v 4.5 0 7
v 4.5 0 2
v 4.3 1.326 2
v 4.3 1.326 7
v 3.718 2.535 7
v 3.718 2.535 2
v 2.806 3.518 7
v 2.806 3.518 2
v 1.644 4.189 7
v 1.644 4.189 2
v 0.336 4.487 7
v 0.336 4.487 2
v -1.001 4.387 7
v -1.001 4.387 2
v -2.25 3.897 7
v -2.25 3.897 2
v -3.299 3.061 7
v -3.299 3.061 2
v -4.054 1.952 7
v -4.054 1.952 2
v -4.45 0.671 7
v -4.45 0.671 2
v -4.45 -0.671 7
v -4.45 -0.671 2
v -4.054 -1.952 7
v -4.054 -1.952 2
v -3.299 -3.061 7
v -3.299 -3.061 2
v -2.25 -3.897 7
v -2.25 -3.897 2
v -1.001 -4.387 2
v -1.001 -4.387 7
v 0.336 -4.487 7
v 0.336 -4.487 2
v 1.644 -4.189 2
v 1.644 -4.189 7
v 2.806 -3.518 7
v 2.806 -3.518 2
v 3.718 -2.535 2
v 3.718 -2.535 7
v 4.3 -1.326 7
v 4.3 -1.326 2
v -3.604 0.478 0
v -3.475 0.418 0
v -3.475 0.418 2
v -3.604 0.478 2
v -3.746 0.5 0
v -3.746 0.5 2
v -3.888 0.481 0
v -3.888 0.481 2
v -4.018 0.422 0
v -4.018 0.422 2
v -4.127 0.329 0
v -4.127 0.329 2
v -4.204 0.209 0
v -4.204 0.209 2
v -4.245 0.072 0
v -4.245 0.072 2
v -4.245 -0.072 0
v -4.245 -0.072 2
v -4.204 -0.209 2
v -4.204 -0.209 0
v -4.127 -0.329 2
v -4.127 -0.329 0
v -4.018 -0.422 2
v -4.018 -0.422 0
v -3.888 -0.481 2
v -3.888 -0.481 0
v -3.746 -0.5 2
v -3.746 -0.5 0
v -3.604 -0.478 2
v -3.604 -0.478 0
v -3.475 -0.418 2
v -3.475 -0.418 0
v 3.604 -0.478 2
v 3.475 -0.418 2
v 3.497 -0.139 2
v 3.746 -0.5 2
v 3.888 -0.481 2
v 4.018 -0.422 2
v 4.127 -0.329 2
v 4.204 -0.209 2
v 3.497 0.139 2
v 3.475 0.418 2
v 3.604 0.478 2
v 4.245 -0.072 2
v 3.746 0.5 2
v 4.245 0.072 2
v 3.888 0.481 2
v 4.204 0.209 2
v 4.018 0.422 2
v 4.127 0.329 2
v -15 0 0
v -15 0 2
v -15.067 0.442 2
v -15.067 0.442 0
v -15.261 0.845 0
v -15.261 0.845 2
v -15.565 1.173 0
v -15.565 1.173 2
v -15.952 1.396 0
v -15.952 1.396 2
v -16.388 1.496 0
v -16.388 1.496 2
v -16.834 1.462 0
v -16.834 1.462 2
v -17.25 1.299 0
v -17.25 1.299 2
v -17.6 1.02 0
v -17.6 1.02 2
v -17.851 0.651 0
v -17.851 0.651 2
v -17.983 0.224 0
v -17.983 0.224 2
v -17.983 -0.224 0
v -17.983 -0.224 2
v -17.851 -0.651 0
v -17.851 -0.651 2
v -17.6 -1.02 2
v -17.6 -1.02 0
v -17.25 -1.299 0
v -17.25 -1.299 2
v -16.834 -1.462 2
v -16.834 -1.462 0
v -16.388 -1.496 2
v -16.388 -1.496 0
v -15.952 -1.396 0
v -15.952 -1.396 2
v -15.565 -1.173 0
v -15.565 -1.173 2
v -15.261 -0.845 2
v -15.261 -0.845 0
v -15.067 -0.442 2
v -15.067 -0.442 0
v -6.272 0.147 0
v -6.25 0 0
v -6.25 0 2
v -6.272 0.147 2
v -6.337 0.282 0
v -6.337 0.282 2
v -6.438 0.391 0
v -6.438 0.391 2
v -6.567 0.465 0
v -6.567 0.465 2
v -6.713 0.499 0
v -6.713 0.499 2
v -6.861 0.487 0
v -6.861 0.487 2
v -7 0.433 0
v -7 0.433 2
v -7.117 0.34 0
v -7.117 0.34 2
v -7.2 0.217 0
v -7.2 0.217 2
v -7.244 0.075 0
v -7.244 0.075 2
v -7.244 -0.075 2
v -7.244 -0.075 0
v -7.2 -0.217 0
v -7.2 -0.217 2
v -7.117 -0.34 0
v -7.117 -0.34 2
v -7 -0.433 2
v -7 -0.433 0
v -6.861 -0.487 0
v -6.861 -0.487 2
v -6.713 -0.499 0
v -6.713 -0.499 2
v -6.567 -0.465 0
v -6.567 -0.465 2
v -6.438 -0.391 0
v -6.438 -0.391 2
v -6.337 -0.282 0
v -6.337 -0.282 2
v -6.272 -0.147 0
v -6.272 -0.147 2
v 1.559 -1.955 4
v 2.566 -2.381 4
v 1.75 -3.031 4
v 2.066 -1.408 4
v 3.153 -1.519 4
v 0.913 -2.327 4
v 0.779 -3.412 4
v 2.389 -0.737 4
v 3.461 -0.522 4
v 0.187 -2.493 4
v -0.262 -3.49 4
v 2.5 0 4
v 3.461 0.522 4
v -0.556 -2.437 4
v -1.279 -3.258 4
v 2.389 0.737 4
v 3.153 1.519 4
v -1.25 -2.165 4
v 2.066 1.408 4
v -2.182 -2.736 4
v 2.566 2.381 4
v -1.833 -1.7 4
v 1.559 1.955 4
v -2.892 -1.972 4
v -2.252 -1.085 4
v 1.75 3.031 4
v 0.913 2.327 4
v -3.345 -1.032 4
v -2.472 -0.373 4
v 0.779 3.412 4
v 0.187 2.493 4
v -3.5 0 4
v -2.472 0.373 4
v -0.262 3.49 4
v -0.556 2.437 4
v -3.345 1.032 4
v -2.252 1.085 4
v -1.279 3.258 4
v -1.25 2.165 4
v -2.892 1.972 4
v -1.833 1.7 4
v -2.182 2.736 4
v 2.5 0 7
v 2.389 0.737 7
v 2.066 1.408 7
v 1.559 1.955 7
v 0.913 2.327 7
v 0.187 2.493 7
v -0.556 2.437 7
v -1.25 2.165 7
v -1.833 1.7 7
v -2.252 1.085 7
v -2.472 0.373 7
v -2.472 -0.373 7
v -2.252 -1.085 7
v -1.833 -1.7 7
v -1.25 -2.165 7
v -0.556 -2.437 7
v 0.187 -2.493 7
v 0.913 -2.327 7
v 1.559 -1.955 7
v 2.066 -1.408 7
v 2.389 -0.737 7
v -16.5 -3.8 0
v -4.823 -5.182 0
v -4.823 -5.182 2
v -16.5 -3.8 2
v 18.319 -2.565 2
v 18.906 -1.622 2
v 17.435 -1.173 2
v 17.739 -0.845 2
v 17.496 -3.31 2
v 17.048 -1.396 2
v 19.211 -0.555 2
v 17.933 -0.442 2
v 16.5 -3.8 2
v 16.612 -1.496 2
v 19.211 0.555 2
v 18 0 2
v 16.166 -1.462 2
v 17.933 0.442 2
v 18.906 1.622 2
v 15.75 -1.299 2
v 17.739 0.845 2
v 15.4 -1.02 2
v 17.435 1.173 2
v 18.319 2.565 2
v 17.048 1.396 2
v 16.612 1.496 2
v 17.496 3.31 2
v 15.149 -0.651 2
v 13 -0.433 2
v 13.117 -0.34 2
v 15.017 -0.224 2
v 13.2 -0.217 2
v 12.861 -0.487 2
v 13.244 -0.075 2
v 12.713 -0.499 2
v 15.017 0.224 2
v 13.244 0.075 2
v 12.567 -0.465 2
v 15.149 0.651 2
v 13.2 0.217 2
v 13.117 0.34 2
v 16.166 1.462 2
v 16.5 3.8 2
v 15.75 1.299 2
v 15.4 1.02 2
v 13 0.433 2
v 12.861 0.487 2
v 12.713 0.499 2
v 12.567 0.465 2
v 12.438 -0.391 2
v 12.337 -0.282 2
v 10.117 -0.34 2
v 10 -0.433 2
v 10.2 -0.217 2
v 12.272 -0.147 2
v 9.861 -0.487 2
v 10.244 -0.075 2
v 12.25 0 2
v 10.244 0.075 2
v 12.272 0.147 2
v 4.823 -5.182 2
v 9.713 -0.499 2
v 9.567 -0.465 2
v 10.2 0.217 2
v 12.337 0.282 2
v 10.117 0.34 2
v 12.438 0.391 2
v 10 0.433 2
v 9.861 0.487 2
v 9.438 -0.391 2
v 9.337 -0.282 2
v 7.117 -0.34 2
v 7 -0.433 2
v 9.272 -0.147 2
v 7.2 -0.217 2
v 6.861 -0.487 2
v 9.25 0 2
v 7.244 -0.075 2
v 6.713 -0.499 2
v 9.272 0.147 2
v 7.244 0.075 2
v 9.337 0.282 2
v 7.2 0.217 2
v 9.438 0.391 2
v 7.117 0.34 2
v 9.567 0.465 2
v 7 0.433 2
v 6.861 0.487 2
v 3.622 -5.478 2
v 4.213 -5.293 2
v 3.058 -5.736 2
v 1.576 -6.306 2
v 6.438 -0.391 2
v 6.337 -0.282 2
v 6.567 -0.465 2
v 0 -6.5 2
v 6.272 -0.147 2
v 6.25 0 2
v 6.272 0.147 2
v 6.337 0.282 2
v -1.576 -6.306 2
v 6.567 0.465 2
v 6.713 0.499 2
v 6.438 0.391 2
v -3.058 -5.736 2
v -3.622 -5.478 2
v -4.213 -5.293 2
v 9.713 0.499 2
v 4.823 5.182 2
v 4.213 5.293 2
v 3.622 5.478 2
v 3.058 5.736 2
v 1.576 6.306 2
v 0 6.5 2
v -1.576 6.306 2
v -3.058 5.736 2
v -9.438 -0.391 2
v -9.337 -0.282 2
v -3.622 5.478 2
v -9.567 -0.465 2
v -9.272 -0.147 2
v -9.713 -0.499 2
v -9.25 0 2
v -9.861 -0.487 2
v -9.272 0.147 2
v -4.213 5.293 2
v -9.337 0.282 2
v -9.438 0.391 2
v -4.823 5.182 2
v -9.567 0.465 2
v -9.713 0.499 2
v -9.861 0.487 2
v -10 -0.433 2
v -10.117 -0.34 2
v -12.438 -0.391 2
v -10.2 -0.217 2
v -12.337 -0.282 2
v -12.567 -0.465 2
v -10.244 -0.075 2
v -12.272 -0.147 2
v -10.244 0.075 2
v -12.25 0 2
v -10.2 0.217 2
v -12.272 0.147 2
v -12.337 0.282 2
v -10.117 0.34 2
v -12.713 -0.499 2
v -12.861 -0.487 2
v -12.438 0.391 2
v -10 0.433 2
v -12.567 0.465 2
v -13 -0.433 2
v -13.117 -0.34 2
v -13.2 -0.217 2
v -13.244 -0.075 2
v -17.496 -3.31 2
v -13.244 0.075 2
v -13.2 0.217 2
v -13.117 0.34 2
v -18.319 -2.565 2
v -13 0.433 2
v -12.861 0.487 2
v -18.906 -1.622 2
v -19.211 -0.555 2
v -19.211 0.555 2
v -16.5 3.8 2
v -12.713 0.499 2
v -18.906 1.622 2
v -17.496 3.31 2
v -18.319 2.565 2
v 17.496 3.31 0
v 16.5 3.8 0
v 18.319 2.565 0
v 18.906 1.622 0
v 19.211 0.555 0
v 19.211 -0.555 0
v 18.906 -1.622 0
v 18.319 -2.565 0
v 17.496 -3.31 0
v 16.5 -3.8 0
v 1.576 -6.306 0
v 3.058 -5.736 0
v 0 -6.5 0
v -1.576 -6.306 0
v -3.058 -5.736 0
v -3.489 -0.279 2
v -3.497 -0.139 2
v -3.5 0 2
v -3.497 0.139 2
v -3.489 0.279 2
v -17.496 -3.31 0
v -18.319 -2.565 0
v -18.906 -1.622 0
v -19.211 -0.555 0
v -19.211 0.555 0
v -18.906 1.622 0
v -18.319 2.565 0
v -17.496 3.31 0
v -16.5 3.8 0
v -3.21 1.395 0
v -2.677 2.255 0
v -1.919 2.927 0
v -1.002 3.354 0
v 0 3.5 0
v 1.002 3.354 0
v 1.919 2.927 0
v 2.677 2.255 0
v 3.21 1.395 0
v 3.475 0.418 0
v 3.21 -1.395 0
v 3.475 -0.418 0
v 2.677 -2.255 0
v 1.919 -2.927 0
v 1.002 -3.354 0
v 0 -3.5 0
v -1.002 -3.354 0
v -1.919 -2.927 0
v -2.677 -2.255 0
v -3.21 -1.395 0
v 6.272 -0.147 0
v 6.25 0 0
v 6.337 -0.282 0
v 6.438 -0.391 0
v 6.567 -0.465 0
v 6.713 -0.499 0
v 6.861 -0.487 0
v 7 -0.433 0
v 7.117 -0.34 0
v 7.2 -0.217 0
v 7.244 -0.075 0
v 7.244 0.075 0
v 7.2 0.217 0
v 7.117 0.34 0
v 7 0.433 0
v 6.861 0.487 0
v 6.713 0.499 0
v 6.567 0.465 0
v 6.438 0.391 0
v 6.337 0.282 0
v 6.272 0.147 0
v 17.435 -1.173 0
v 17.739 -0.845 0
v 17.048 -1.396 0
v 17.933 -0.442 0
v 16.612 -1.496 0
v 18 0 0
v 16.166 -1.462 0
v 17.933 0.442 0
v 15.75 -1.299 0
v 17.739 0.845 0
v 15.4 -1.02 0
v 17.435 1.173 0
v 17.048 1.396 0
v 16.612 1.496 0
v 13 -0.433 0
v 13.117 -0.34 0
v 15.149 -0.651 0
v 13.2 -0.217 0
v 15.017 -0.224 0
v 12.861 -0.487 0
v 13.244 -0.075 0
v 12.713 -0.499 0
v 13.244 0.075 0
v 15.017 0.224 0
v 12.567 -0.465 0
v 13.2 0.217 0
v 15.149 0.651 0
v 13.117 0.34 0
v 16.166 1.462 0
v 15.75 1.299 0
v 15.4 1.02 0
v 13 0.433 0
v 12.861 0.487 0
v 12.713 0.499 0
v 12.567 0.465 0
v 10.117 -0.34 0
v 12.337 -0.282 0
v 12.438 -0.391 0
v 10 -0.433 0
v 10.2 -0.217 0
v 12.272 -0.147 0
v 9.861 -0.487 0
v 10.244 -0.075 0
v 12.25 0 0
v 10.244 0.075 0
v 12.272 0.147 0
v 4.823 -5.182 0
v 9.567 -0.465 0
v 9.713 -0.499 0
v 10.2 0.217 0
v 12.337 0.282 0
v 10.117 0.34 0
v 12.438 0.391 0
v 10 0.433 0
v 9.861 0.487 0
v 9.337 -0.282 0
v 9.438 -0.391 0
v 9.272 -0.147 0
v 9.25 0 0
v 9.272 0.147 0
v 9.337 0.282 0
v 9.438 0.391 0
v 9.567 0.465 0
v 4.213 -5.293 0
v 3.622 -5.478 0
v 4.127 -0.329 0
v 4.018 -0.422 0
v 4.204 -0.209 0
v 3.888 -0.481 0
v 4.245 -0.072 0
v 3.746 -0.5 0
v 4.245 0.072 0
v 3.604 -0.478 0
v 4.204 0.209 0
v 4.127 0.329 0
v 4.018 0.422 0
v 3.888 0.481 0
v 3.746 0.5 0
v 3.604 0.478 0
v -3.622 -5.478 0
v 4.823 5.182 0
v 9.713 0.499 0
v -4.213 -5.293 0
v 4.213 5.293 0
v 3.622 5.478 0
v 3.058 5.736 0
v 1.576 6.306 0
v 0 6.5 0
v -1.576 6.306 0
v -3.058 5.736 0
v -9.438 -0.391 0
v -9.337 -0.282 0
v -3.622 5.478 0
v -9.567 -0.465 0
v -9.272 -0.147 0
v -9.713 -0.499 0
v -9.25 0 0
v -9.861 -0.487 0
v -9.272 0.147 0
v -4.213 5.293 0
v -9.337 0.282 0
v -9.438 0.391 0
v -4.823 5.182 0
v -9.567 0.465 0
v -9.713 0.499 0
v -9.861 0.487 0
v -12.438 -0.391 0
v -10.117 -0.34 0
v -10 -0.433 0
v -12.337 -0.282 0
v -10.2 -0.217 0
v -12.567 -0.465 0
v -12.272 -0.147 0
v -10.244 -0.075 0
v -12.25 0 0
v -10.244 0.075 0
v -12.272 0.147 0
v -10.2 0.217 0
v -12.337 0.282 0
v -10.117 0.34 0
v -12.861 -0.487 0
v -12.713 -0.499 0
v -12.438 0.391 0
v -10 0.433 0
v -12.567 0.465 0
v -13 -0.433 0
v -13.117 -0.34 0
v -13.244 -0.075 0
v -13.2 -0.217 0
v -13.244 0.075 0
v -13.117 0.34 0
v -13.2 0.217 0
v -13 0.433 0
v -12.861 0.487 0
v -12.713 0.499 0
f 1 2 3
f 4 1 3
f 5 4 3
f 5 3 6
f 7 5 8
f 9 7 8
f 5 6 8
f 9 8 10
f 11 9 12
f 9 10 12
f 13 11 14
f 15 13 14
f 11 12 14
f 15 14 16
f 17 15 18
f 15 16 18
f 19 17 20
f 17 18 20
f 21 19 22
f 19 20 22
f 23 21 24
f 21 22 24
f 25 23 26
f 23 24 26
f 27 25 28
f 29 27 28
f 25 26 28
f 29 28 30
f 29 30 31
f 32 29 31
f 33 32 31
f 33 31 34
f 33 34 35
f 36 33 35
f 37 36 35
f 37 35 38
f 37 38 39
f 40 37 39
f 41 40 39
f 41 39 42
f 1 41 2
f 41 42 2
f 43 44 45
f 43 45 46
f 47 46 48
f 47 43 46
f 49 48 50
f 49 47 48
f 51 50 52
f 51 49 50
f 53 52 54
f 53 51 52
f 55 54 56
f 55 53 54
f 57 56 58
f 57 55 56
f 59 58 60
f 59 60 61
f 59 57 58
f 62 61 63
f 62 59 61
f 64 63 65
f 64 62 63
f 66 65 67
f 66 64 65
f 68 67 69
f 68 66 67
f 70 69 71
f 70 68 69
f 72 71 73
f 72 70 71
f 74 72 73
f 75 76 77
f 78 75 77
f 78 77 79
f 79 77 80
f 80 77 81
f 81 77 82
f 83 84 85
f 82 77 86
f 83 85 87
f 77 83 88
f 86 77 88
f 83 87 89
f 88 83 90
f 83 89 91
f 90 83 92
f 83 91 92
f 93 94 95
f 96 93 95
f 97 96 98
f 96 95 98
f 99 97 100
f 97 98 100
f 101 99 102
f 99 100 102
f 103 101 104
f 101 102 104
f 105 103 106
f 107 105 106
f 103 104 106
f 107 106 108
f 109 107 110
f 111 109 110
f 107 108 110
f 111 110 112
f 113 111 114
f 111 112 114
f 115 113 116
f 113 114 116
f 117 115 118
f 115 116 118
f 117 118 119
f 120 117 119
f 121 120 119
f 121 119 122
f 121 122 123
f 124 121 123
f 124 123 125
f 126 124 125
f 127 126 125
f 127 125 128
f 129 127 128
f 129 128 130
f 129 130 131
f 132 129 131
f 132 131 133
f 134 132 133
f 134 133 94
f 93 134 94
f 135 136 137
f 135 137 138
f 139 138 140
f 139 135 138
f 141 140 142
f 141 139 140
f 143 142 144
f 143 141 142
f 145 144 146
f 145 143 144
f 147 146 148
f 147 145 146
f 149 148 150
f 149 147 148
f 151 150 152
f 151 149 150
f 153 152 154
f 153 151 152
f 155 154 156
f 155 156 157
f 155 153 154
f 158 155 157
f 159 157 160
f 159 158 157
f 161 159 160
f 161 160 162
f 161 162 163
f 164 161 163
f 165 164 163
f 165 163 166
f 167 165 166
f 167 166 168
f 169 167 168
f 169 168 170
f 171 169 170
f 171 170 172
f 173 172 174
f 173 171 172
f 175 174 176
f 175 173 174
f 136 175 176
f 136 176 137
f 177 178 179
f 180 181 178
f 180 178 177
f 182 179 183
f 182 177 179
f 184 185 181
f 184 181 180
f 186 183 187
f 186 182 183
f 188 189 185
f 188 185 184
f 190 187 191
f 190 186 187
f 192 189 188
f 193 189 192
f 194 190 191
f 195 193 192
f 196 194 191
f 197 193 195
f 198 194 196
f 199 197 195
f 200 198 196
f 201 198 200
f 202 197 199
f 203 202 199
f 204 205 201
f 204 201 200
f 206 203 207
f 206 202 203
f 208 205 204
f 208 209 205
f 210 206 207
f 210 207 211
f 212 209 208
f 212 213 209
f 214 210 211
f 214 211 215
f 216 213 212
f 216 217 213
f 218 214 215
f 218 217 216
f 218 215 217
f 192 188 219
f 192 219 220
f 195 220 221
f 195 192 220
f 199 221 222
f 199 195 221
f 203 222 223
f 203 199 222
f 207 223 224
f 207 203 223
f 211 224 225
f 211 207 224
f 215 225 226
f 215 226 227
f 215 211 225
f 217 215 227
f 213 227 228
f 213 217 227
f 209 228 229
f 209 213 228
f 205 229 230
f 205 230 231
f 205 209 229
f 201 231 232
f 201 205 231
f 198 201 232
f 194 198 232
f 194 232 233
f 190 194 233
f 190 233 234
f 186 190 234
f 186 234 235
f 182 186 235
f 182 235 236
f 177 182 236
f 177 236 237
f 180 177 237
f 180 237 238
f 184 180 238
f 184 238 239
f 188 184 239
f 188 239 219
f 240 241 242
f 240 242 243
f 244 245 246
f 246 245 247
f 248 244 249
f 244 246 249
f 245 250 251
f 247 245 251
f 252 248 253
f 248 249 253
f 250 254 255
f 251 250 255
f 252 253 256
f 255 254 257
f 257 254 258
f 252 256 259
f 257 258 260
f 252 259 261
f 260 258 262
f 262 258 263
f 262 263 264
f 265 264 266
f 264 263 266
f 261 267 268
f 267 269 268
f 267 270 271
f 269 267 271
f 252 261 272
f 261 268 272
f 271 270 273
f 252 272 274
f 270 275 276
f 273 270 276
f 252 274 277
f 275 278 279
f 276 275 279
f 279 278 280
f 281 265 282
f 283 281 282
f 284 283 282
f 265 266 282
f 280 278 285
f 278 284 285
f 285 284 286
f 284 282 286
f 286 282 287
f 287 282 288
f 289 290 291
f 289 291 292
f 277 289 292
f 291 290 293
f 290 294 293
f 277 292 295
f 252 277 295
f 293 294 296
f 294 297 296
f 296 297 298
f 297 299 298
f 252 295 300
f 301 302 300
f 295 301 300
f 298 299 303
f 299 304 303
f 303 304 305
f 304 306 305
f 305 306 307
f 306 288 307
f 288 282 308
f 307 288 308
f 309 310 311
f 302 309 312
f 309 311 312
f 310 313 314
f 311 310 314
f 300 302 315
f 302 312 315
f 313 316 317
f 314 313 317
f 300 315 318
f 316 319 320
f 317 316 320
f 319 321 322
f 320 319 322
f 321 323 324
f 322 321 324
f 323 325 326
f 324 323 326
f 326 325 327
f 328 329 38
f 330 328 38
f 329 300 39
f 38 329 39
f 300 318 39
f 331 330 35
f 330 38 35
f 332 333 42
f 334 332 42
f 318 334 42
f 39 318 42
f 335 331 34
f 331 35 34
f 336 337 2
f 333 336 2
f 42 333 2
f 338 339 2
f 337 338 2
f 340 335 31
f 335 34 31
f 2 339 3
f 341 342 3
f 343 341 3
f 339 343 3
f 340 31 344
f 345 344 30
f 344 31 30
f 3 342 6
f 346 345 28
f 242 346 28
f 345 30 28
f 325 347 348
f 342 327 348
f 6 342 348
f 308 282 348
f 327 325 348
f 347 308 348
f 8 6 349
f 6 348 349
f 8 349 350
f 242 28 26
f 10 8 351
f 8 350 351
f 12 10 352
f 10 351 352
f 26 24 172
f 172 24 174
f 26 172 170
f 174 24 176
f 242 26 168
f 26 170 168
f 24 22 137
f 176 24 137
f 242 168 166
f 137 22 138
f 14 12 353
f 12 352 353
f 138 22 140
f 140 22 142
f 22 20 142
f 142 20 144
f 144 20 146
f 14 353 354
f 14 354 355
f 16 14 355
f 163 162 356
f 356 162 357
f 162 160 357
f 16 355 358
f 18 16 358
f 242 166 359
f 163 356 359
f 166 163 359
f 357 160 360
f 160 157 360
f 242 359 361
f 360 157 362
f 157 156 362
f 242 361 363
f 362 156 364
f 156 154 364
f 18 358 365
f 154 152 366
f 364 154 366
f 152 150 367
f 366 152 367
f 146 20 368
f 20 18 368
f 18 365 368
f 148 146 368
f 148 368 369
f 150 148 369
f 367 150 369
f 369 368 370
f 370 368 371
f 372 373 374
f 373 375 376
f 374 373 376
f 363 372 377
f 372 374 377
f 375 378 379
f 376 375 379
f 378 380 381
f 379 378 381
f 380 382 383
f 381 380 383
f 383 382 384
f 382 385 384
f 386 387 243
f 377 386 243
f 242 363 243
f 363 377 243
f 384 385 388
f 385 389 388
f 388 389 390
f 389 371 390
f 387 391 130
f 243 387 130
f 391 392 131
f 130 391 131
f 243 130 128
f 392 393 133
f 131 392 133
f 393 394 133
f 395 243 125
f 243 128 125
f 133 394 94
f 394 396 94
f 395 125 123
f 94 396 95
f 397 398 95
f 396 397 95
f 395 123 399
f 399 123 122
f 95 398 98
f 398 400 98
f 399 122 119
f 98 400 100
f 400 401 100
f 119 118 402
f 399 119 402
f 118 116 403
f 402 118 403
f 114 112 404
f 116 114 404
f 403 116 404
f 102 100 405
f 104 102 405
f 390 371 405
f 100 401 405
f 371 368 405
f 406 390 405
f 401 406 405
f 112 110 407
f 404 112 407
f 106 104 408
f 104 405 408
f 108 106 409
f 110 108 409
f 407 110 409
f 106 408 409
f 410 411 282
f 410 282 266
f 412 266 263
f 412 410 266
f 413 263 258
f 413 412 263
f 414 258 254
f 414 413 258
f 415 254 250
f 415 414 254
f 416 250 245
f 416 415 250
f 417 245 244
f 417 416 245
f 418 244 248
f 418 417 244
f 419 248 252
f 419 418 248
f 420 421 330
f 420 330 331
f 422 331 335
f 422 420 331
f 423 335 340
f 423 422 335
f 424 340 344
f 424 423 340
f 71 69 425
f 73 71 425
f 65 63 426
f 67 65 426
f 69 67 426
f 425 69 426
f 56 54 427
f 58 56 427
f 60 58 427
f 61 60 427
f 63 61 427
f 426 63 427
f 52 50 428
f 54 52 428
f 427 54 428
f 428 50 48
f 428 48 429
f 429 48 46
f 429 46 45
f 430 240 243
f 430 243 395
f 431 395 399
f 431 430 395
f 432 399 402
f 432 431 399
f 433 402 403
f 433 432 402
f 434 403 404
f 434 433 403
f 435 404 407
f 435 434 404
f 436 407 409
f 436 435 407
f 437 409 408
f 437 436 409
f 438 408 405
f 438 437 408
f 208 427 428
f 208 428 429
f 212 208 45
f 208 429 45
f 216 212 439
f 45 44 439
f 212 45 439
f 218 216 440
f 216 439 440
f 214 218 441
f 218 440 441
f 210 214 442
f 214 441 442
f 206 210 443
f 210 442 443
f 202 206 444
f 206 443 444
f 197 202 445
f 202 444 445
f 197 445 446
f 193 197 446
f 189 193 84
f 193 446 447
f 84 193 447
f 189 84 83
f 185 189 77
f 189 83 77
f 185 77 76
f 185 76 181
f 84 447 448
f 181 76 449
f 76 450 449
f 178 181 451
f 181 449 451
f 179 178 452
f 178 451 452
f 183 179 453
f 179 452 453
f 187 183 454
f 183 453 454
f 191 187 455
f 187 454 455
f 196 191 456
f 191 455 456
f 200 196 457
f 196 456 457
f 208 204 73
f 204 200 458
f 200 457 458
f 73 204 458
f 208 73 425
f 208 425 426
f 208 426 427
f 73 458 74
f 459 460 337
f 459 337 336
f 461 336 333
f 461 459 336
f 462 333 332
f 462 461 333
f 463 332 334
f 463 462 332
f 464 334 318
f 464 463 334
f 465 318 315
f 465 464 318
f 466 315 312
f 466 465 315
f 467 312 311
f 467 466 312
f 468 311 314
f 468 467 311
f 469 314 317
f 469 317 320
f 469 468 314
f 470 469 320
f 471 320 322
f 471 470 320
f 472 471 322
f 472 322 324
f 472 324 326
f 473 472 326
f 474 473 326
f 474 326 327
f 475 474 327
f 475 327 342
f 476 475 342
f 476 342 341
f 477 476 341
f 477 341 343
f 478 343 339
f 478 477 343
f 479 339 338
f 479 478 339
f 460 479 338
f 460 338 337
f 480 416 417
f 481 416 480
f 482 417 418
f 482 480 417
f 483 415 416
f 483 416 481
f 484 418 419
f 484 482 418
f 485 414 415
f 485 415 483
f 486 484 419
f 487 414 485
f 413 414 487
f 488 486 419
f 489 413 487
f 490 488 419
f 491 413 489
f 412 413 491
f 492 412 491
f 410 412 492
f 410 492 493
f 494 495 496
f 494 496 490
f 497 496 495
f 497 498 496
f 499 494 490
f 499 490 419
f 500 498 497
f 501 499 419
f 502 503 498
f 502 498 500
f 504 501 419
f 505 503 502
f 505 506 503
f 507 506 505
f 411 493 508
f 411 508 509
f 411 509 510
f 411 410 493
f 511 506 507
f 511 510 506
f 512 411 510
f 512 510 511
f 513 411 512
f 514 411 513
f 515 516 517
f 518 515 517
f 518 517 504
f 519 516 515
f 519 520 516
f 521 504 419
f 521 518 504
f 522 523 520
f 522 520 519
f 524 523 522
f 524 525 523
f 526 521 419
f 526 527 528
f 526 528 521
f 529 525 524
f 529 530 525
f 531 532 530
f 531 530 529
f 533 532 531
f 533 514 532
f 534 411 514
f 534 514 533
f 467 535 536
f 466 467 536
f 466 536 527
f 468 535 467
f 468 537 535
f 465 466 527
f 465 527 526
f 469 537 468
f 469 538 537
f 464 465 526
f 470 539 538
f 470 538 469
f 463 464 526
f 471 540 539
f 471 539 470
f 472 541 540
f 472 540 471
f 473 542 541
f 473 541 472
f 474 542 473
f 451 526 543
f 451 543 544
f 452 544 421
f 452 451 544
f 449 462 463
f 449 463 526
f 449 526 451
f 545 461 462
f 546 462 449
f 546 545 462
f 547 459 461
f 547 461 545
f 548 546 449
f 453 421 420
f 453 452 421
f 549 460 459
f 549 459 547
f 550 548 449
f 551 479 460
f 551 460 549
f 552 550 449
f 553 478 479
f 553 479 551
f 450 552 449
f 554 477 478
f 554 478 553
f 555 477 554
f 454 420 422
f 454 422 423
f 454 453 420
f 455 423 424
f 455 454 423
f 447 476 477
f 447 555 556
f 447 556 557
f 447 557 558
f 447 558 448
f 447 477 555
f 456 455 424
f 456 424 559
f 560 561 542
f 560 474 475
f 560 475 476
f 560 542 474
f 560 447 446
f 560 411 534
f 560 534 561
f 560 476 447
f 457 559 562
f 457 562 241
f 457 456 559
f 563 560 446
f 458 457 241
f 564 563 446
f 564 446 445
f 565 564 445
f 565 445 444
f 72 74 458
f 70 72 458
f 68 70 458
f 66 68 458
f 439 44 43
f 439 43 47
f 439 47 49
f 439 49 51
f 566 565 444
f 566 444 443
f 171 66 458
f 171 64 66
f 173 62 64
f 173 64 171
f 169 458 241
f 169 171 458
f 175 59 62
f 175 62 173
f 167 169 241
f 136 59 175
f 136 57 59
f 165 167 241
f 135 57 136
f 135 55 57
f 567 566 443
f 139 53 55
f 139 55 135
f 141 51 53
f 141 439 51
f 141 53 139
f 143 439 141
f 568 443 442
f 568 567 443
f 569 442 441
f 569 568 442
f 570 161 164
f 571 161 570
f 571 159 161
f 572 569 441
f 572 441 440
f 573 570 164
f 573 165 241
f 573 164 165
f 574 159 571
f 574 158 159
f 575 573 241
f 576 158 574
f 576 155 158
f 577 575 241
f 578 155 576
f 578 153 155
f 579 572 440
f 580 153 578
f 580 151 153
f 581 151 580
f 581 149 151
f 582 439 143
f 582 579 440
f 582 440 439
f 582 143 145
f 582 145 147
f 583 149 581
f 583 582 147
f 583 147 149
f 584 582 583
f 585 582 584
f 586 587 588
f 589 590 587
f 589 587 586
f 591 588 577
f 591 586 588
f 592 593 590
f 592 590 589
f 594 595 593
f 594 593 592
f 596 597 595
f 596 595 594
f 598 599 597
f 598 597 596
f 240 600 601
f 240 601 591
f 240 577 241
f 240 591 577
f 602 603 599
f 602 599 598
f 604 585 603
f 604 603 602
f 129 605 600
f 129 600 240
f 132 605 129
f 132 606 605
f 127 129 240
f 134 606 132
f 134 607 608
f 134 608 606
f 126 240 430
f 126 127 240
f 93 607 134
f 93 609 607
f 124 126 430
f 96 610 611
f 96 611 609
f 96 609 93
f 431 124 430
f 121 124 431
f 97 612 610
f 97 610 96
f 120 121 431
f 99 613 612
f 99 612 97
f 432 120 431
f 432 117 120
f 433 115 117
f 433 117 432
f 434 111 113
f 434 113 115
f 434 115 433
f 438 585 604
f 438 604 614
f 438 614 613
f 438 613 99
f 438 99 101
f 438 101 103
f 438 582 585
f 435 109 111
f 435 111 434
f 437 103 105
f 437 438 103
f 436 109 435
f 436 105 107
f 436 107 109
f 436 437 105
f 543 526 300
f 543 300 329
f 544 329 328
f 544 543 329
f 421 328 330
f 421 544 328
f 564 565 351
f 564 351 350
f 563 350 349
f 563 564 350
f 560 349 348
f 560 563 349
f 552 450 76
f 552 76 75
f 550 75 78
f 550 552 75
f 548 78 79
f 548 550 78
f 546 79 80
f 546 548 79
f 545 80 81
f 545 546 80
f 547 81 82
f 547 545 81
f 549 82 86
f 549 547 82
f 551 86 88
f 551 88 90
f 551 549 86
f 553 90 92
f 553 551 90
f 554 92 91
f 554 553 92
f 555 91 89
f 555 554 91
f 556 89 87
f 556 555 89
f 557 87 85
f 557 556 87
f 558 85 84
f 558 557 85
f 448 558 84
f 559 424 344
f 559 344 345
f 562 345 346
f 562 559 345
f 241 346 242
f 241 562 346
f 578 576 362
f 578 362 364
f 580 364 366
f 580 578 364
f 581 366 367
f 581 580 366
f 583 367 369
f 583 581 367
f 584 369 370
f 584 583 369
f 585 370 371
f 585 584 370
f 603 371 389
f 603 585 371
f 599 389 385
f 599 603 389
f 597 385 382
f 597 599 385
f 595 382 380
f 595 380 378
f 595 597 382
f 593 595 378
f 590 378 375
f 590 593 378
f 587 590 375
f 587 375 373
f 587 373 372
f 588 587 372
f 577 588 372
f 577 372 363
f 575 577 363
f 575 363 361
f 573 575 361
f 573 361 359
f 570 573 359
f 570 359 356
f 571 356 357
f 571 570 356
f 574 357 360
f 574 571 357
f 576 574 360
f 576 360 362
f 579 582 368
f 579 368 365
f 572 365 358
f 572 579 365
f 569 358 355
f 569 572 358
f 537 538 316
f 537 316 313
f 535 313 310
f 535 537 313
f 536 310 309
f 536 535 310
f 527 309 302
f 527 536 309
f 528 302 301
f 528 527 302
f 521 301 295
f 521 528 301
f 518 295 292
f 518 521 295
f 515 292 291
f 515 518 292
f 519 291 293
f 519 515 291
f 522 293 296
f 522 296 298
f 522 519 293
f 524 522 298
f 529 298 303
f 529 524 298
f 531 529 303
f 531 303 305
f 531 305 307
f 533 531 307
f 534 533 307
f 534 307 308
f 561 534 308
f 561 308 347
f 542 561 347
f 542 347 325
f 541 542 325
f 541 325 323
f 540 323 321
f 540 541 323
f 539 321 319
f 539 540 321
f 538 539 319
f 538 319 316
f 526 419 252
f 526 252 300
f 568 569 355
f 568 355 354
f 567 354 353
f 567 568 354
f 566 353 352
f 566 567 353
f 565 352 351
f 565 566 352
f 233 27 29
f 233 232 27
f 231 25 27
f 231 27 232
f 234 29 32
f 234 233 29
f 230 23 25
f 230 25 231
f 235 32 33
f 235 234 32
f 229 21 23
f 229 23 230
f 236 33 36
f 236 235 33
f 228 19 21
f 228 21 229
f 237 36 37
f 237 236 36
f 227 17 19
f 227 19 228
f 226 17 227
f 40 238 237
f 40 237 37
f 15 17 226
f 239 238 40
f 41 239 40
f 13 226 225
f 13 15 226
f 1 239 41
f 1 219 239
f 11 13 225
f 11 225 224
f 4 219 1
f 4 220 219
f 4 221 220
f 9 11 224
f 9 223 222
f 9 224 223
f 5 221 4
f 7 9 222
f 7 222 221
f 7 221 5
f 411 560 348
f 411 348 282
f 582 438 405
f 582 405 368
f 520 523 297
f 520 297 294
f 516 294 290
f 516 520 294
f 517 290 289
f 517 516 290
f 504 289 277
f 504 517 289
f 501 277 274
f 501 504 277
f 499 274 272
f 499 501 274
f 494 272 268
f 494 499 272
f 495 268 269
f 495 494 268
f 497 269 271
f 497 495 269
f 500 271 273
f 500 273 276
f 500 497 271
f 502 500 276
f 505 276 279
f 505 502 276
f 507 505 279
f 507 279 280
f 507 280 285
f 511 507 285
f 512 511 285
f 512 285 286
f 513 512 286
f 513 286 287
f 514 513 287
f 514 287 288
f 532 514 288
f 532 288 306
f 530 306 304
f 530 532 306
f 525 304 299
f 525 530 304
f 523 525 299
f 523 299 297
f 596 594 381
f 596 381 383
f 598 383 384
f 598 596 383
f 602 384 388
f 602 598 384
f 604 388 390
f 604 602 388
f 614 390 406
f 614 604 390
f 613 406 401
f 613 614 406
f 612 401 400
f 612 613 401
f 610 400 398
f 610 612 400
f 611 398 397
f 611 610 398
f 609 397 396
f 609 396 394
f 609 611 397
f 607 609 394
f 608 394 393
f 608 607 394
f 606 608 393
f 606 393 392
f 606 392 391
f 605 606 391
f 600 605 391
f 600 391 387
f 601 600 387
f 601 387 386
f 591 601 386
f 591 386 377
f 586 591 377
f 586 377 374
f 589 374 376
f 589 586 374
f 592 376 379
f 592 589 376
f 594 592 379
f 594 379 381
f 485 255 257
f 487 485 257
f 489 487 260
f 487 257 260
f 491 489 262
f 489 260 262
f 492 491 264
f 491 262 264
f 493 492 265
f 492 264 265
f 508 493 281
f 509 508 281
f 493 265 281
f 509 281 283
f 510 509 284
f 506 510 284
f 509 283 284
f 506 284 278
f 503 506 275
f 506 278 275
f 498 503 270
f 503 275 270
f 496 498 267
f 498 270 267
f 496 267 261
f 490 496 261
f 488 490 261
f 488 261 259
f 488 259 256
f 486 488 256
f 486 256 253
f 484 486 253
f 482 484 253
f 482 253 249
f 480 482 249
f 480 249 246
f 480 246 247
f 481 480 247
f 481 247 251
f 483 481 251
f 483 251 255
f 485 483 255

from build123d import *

# Parameters (mm, degrees)
SKETCH_1_R          = 0.5
EXTRUDE_1_DEPTH     = 2
SKETCH_2_R          = 4.5
SKETCH_2_R_2        = 2.5
EXTRUDE_2_DEPTH     = 5
SKETCH_3_R          = 3.5
CUT_EXTRUDE_1_DEPTH = 4
SKETCH_5_R          = 1.5
CUT_EXTRUDE_2_DEPTH = 10


with BuildPart() as part:
    # 草图1 → 凸台-拉伸1 (new body)
    with BuildSketch(Plane.XY):
        with BuildLine():
            Line((16.5, -3.799671038), (4.823155871, -5.182135299))
            ThreePointArc((4.823155871, -5.182135299), (3.914969309, -5.376520098), (3.058401724, -5.735519061))
            ThreePointArc((3.058401724, -5.735519061), (0, -6.5), (-3.058401724, -5.735519061))
            ThreePointArc((-3.058401724, -5.735519061), (-3.914969309, -5.376520098), (-4.823155871, -5.182135299))
            Line((-4.823155871, -5.182135299), (-16.5, -3.799671038))
            ThreePointArc((-16.5, -3.799671038), (-19.25, 0), (-16.5, 3.799671038))
            Line((-16.5, 3.799671038), (-4.823155871, 5.182135299))
            ThreePointArc((-4.823155871, 5.182135299), (-3.914969309, 5.376520098), (-3.058401724, 5.735519061))
            ThreePointArc((-3.058401724, 5.735519061), (0, 6.5), (3.058401724, 5.735519061))
            ThreePointArc((3.058401724, 5.735519061), (3.914969309, 5.376520098), (4.823155871, 5.182135299))
            Line((4.823155871, 5.182135299), (16.5, 3.799671038))
            ThreePointArc((16.5, 3.799671038), (19.25, 0), (16.5, -3.799671038))
        make_face()
        with Locations((-16.5, 0)):
            Circle(SKETCH_1_R, mode=Mode.SUBTRACT)
        with Locations((-12.75, 0)):
            Circle(SKETCH_1_R, mode=Mode.SUBTRACT)
        with Locations((-9.75, 0)):
            Circle(SKETCH_1_R, mode=Mode.SUBTRACT)
        with Locations((-6.75, 0)):
            Circle(SKETCH_1_R, mode=Mode.SUBTRACT)
        with Locations((-3.75, 0)):
            Circle(SKETCH_1_R, mode=Mode.SUBTRACT)
        with Locations(Location((3.75, 0, 0), (0, 0, 180))):
            Circle(SKETCH_1_R, mode=Mode.SUBTRACT)
        with Locations(Location((6.75, 0, 0), (0, 0, 180))):
            Circle(SKETCH_1_R, mode=Mode.SUBTRACT)
        with Locations(Location((9.75, 0, 0), (0, 0, 180))):
            Circle(SKETCH_1_R, mode=Mode.SUBTRACT)
        with Locations(Location((12.75, 0, 0), (0, 0, 180))):
            Circle(SKETCH_1_R, mode=Mode.SUBTRACT)
        with Locations(Location((16.5, 0, 0), (0, 0, 180))):
            Circle(SKETCH_1_R, mode=Mode.SUBTRACT)
    extrude(amount=EXTRUDE_1_DEPTH)

    # 草图2 → 凸台-拉伸2 (add)
    with BuildSketch(Plane.XY.offset(2)):
        Circle(SKETCH_2_R)
        Circle(SKETCH_2_R_2, mode=Mode.SUBTRACT)
    extrude(amount=EXTRUDE_2_DEPTH)

    # 草图3 → 切除-拉伸1 (cut)
    with BuildSketch(Plane(origin=(0, 0, 0), x_dir=(-1, 0, 0), z_dir=(0, 0, -1))):
        Circle(SKETCH_3_R)
    extrude(amount=-CUT_EXTRUDE_1_DEPTH, mode=Mode.SUBTRACT)

    # 草图5 → 切除-拉伸2 (cut)
    with BuildSketch(Plane.XY.offset(2)):
        with Locations((16.5, 0)):
            Circle(SKETCH_5_R)
        with Locations((-16.5, 0)):
            Circle(SKETCH_5_R)
    extrude(amount=-CUT_EXTRUDE_2_DEPTH, mode=Mode.SUBTRACT)


solid = part.part
